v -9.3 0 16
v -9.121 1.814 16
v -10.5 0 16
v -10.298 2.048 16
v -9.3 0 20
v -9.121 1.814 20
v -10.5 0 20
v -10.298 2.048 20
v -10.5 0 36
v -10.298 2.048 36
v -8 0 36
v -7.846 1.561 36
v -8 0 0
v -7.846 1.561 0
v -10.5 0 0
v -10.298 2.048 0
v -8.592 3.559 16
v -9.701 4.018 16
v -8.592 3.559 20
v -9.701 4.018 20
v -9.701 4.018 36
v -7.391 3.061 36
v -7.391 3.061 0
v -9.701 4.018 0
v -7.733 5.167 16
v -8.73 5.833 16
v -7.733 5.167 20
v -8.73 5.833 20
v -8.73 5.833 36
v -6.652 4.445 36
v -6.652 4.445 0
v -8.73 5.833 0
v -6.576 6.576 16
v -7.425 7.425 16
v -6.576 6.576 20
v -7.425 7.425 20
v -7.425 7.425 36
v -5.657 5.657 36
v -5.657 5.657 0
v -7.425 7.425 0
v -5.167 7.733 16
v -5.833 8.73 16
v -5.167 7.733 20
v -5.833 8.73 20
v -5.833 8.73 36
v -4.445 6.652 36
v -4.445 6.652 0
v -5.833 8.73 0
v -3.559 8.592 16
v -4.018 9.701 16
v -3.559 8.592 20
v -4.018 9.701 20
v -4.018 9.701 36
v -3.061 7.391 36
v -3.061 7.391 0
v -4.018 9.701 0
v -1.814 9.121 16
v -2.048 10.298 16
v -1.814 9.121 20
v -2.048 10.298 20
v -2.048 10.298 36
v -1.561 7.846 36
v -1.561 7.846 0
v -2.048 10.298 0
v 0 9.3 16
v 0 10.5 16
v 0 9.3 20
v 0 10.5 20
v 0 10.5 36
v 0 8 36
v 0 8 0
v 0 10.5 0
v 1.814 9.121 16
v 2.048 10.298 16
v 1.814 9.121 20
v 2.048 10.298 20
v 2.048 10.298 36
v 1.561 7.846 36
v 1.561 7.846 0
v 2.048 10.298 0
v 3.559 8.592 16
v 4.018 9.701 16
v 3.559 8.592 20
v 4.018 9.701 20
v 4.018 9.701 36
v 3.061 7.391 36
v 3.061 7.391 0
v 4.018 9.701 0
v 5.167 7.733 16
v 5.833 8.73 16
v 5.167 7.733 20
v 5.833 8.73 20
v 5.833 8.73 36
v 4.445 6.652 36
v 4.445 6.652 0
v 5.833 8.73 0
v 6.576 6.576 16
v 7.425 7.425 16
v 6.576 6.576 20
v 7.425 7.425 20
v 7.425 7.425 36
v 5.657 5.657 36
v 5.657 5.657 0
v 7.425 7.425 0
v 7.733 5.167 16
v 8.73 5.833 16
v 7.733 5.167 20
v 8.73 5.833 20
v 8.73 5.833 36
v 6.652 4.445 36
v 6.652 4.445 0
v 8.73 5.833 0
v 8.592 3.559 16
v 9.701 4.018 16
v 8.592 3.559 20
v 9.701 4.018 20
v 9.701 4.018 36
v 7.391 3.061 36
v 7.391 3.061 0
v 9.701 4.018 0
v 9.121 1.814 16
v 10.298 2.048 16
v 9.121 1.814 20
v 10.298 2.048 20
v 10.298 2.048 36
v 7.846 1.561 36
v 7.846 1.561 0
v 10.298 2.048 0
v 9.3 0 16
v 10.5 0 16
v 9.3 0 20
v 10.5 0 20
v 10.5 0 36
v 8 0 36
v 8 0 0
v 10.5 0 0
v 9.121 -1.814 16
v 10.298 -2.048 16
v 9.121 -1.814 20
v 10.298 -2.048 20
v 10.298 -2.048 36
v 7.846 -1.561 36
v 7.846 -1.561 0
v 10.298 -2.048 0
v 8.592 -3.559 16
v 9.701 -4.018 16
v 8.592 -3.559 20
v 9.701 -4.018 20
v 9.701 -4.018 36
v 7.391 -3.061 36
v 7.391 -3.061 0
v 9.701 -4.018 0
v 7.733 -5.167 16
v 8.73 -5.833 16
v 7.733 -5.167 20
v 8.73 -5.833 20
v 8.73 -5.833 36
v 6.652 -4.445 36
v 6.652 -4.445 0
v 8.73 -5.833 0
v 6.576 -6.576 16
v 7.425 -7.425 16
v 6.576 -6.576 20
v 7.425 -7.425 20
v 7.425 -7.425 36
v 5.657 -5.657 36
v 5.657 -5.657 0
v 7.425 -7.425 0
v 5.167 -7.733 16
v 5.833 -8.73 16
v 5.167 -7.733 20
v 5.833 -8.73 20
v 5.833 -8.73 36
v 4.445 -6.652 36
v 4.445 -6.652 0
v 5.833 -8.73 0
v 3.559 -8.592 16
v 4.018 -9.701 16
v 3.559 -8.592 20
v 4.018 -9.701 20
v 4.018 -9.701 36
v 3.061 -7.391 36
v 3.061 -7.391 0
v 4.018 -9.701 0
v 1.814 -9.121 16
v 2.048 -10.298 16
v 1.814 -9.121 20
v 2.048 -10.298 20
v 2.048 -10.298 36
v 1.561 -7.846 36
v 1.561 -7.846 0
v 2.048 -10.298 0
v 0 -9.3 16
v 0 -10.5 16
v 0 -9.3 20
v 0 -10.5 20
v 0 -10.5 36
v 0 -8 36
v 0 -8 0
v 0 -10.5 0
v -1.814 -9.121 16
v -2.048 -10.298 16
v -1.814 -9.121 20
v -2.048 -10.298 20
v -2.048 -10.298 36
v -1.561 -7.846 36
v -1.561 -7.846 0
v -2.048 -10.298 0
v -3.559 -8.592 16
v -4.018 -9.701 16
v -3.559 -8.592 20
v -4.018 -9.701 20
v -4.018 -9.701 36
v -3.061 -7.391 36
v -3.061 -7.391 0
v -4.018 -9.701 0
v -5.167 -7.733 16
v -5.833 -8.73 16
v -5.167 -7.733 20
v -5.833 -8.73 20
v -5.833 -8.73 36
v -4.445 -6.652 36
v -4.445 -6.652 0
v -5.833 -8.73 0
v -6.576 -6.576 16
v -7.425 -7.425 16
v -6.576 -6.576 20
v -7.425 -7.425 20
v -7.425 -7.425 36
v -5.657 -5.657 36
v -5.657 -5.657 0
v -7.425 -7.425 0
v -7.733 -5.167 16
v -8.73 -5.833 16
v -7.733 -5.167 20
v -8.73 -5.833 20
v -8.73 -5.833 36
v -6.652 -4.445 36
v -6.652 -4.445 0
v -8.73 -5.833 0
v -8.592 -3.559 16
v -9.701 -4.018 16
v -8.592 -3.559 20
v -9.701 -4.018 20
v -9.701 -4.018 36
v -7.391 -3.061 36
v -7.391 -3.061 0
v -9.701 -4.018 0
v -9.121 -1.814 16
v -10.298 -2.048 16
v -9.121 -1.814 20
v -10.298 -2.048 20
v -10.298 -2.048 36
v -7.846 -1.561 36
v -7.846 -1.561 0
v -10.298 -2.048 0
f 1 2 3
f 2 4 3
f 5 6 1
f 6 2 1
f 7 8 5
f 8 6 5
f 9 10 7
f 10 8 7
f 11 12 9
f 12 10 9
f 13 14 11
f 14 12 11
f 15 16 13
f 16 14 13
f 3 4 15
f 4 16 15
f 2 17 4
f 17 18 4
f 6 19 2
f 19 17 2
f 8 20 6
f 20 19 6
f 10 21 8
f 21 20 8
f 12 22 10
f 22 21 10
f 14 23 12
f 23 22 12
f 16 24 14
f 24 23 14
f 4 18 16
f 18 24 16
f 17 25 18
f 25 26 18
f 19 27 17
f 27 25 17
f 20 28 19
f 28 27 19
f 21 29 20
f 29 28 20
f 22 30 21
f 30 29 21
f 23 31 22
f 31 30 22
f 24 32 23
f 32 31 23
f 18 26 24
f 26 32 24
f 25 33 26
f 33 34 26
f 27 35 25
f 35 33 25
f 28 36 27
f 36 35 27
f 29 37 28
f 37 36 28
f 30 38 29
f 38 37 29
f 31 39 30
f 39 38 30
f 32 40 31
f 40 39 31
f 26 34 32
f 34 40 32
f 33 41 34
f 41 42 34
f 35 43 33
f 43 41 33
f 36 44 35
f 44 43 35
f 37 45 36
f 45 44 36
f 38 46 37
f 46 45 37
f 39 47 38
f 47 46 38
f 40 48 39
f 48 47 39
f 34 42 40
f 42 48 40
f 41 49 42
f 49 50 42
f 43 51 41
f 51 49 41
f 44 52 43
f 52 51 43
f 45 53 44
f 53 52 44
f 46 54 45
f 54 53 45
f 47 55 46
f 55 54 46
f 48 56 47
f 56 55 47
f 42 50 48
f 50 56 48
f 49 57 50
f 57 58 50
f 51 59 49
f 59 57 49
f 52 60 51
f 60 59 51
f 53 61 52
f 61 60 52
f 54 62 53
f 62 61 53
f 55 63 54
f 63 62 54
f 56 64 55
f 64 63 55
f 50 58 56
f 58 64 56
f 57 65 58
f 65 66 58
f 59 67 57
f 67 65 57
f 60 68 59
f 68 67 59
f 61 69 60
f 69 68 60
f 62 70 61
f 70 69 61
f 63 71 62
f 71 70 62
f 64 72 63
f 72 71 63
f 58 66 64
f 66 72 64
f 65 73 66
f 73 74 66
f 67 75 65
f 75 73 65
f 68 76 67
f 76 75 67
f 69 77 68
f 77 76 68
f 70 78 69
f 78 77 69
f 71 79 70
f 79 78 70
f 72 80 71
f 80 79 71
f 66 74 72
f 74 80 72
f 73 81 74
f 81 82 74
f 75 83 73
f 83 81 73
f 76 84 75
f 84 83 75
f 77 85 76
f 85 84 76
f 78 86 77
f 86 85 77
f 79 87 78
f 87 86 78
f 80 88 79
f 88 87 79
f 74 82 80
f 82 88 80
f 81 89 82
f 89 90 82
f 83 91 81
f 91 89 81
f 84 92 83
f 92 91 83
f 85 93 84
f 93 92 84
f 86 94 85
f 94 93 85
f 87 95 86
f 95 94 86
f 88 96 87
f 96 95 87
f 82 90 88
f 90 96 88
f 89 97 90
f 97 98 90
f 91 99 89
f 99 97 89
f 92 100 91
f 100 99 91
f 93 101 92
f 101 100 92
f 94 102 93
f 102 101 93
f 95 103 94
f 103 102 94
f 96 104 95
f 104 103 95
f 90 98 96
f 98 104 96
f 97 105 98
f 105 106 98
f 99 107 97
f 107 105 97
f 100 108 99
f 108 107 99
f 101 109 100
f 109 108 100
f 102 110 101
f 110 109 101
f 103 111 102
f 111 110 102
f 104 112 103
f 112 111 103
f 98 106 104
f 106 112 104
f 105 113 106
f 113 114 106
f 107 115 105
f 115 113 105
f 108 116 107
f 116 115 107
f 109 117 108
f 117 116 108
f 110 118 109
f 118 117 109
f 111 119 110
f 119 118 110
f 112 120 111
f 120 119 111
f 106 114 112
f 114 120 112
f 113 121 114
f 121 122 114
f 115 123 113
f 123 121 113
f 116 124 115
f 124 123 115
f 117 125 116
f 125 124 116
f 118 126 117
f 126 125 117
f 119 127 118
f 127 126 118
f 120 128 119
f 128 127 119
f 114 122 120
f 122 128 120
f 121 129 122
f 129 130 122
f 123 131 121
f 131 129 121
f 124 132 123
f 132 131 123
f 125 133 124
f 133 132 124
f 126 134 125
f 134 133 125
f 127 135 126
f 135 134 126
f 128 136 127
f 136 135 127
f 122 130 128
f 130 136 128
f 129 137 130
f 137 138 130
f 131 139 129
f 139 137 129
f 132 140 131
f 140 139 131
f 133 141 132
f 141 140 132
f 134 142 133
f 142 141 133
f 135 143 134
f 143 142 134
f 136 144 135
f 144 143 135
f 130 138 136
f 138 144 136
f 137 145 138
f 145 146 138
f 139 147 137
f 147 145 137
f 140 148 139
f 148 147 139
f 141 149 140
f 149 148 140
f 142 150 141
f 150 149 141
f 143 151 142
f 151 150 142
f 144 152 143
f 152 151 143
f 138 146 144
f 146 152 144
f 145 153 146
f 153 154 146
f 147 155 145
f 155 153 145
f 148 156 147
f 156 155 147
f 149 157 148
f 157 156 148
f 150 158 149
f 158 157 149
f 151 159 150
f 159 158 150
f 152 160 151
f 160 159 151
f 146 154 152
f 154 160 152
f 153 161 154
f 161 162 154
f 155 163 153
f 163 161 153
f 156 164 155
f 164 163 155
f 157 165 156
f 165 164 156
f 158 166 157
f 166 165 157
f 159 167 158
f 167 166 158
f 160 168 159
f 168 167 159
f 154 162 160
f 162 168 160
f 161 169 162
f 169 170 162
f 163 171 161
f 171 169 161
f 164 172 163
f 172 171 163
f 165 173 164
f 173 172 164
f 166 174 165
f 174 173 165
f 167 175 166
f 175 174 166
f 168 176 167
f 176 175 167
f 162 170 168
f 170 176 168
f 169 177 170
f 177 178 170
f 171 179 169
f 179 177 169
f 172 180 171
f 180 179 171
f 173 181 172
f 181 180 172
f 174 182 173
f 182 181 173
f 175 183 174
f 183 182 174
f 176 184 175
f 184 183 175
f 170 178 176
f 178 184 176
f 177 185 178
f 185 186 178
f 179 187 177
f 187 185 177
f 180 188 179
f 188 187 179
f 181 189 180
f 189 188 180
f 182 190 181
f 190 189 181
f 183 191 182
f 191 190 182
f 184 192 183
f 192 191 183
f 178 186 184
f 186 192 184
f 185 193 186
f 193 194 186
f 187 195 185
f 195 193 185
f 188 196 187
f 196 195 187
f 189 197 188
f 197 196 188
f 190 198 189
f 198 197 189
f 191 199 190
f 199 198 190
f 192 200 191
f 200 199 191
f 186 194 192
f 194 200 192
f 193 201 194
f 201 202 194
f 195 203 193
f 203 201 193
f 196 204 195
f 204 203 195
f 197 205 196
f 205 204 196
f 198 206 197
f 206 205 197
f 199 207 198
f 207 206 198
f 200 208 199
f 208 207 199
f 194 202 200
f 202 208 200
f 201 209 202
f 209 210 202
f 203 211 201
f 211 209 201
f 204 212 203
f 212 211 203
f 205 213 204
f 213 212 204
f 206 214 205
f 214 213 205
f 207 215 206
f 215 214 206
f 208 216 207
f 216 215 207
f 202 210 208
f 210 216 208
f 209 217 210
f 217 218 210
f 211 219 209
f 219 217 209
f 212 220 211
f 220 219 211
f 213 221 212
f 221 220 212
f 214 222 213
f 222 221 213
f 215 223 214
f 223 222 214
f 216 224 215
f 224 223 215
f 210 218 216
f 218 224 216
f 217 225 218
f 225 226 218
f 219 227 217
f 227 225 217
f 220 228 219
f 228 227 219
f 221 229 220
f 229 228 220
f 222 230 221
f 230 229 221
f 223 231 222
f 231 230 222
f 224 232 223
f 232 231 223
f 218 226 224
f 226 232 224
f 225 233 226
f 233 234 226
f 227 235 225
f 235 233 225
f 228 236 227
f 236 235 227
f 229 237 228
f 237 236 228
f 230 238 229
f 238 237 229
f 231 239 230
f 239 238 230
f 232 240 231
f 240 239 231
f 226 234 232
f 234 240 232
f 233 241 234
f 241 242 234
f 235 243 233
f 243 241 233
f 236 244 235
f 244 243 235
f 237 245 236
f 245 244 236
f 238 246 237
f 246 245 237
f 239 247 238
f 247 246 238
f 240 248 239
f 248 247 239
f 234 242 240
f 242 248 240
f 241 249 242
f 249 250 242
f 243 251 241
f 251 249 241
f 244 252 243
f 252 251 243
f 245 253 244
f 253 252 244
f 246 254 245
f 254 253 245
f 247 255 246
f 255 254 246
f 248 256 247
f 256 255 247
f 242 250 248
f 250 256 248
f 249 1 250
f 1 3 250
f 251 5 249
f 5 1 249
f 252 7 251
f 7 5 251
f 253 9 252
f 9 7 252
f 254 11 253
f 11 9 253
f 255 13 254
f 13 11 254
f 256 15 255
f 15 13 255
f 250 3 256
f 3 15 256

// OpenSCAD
$fn = 32;

// ----------------------------------------------------------------------
// Grooved revolve: plain_grooves, bore R8
// ----------------------------------------------------------------------

// --- parameters (mm) ---
bore_r = 8;               // bore radius
outer_r = 10.5;           // outer radius of the body
total_h = 36;             // overall height, Z
wall = 2.5;               // radial wall thickness
groove_w = 4;             // groove width
groove_d = 1.2;           // groove depth
grooves = 1;              // number of outer grooves

bbox_x = 2 * outer_r;  // full diameter
bore_d = 2 * bore_r;  // bore diameter
body_d = 2 * outer_r;  // body diameter
revolve_angle = 360;  // full turn around the Z axis

profile = [[8, 0], [10.5, 0], [10.5, 16], [9.3, 16], [9.3, 20], [10.5, 20], [10.5, 36], [8, 36]];  // primary outline, 8 points, counter clockwise

// --- the one profile operation ---
rotate_extrude(angle = revolve_angle) polygon(points = profile);
